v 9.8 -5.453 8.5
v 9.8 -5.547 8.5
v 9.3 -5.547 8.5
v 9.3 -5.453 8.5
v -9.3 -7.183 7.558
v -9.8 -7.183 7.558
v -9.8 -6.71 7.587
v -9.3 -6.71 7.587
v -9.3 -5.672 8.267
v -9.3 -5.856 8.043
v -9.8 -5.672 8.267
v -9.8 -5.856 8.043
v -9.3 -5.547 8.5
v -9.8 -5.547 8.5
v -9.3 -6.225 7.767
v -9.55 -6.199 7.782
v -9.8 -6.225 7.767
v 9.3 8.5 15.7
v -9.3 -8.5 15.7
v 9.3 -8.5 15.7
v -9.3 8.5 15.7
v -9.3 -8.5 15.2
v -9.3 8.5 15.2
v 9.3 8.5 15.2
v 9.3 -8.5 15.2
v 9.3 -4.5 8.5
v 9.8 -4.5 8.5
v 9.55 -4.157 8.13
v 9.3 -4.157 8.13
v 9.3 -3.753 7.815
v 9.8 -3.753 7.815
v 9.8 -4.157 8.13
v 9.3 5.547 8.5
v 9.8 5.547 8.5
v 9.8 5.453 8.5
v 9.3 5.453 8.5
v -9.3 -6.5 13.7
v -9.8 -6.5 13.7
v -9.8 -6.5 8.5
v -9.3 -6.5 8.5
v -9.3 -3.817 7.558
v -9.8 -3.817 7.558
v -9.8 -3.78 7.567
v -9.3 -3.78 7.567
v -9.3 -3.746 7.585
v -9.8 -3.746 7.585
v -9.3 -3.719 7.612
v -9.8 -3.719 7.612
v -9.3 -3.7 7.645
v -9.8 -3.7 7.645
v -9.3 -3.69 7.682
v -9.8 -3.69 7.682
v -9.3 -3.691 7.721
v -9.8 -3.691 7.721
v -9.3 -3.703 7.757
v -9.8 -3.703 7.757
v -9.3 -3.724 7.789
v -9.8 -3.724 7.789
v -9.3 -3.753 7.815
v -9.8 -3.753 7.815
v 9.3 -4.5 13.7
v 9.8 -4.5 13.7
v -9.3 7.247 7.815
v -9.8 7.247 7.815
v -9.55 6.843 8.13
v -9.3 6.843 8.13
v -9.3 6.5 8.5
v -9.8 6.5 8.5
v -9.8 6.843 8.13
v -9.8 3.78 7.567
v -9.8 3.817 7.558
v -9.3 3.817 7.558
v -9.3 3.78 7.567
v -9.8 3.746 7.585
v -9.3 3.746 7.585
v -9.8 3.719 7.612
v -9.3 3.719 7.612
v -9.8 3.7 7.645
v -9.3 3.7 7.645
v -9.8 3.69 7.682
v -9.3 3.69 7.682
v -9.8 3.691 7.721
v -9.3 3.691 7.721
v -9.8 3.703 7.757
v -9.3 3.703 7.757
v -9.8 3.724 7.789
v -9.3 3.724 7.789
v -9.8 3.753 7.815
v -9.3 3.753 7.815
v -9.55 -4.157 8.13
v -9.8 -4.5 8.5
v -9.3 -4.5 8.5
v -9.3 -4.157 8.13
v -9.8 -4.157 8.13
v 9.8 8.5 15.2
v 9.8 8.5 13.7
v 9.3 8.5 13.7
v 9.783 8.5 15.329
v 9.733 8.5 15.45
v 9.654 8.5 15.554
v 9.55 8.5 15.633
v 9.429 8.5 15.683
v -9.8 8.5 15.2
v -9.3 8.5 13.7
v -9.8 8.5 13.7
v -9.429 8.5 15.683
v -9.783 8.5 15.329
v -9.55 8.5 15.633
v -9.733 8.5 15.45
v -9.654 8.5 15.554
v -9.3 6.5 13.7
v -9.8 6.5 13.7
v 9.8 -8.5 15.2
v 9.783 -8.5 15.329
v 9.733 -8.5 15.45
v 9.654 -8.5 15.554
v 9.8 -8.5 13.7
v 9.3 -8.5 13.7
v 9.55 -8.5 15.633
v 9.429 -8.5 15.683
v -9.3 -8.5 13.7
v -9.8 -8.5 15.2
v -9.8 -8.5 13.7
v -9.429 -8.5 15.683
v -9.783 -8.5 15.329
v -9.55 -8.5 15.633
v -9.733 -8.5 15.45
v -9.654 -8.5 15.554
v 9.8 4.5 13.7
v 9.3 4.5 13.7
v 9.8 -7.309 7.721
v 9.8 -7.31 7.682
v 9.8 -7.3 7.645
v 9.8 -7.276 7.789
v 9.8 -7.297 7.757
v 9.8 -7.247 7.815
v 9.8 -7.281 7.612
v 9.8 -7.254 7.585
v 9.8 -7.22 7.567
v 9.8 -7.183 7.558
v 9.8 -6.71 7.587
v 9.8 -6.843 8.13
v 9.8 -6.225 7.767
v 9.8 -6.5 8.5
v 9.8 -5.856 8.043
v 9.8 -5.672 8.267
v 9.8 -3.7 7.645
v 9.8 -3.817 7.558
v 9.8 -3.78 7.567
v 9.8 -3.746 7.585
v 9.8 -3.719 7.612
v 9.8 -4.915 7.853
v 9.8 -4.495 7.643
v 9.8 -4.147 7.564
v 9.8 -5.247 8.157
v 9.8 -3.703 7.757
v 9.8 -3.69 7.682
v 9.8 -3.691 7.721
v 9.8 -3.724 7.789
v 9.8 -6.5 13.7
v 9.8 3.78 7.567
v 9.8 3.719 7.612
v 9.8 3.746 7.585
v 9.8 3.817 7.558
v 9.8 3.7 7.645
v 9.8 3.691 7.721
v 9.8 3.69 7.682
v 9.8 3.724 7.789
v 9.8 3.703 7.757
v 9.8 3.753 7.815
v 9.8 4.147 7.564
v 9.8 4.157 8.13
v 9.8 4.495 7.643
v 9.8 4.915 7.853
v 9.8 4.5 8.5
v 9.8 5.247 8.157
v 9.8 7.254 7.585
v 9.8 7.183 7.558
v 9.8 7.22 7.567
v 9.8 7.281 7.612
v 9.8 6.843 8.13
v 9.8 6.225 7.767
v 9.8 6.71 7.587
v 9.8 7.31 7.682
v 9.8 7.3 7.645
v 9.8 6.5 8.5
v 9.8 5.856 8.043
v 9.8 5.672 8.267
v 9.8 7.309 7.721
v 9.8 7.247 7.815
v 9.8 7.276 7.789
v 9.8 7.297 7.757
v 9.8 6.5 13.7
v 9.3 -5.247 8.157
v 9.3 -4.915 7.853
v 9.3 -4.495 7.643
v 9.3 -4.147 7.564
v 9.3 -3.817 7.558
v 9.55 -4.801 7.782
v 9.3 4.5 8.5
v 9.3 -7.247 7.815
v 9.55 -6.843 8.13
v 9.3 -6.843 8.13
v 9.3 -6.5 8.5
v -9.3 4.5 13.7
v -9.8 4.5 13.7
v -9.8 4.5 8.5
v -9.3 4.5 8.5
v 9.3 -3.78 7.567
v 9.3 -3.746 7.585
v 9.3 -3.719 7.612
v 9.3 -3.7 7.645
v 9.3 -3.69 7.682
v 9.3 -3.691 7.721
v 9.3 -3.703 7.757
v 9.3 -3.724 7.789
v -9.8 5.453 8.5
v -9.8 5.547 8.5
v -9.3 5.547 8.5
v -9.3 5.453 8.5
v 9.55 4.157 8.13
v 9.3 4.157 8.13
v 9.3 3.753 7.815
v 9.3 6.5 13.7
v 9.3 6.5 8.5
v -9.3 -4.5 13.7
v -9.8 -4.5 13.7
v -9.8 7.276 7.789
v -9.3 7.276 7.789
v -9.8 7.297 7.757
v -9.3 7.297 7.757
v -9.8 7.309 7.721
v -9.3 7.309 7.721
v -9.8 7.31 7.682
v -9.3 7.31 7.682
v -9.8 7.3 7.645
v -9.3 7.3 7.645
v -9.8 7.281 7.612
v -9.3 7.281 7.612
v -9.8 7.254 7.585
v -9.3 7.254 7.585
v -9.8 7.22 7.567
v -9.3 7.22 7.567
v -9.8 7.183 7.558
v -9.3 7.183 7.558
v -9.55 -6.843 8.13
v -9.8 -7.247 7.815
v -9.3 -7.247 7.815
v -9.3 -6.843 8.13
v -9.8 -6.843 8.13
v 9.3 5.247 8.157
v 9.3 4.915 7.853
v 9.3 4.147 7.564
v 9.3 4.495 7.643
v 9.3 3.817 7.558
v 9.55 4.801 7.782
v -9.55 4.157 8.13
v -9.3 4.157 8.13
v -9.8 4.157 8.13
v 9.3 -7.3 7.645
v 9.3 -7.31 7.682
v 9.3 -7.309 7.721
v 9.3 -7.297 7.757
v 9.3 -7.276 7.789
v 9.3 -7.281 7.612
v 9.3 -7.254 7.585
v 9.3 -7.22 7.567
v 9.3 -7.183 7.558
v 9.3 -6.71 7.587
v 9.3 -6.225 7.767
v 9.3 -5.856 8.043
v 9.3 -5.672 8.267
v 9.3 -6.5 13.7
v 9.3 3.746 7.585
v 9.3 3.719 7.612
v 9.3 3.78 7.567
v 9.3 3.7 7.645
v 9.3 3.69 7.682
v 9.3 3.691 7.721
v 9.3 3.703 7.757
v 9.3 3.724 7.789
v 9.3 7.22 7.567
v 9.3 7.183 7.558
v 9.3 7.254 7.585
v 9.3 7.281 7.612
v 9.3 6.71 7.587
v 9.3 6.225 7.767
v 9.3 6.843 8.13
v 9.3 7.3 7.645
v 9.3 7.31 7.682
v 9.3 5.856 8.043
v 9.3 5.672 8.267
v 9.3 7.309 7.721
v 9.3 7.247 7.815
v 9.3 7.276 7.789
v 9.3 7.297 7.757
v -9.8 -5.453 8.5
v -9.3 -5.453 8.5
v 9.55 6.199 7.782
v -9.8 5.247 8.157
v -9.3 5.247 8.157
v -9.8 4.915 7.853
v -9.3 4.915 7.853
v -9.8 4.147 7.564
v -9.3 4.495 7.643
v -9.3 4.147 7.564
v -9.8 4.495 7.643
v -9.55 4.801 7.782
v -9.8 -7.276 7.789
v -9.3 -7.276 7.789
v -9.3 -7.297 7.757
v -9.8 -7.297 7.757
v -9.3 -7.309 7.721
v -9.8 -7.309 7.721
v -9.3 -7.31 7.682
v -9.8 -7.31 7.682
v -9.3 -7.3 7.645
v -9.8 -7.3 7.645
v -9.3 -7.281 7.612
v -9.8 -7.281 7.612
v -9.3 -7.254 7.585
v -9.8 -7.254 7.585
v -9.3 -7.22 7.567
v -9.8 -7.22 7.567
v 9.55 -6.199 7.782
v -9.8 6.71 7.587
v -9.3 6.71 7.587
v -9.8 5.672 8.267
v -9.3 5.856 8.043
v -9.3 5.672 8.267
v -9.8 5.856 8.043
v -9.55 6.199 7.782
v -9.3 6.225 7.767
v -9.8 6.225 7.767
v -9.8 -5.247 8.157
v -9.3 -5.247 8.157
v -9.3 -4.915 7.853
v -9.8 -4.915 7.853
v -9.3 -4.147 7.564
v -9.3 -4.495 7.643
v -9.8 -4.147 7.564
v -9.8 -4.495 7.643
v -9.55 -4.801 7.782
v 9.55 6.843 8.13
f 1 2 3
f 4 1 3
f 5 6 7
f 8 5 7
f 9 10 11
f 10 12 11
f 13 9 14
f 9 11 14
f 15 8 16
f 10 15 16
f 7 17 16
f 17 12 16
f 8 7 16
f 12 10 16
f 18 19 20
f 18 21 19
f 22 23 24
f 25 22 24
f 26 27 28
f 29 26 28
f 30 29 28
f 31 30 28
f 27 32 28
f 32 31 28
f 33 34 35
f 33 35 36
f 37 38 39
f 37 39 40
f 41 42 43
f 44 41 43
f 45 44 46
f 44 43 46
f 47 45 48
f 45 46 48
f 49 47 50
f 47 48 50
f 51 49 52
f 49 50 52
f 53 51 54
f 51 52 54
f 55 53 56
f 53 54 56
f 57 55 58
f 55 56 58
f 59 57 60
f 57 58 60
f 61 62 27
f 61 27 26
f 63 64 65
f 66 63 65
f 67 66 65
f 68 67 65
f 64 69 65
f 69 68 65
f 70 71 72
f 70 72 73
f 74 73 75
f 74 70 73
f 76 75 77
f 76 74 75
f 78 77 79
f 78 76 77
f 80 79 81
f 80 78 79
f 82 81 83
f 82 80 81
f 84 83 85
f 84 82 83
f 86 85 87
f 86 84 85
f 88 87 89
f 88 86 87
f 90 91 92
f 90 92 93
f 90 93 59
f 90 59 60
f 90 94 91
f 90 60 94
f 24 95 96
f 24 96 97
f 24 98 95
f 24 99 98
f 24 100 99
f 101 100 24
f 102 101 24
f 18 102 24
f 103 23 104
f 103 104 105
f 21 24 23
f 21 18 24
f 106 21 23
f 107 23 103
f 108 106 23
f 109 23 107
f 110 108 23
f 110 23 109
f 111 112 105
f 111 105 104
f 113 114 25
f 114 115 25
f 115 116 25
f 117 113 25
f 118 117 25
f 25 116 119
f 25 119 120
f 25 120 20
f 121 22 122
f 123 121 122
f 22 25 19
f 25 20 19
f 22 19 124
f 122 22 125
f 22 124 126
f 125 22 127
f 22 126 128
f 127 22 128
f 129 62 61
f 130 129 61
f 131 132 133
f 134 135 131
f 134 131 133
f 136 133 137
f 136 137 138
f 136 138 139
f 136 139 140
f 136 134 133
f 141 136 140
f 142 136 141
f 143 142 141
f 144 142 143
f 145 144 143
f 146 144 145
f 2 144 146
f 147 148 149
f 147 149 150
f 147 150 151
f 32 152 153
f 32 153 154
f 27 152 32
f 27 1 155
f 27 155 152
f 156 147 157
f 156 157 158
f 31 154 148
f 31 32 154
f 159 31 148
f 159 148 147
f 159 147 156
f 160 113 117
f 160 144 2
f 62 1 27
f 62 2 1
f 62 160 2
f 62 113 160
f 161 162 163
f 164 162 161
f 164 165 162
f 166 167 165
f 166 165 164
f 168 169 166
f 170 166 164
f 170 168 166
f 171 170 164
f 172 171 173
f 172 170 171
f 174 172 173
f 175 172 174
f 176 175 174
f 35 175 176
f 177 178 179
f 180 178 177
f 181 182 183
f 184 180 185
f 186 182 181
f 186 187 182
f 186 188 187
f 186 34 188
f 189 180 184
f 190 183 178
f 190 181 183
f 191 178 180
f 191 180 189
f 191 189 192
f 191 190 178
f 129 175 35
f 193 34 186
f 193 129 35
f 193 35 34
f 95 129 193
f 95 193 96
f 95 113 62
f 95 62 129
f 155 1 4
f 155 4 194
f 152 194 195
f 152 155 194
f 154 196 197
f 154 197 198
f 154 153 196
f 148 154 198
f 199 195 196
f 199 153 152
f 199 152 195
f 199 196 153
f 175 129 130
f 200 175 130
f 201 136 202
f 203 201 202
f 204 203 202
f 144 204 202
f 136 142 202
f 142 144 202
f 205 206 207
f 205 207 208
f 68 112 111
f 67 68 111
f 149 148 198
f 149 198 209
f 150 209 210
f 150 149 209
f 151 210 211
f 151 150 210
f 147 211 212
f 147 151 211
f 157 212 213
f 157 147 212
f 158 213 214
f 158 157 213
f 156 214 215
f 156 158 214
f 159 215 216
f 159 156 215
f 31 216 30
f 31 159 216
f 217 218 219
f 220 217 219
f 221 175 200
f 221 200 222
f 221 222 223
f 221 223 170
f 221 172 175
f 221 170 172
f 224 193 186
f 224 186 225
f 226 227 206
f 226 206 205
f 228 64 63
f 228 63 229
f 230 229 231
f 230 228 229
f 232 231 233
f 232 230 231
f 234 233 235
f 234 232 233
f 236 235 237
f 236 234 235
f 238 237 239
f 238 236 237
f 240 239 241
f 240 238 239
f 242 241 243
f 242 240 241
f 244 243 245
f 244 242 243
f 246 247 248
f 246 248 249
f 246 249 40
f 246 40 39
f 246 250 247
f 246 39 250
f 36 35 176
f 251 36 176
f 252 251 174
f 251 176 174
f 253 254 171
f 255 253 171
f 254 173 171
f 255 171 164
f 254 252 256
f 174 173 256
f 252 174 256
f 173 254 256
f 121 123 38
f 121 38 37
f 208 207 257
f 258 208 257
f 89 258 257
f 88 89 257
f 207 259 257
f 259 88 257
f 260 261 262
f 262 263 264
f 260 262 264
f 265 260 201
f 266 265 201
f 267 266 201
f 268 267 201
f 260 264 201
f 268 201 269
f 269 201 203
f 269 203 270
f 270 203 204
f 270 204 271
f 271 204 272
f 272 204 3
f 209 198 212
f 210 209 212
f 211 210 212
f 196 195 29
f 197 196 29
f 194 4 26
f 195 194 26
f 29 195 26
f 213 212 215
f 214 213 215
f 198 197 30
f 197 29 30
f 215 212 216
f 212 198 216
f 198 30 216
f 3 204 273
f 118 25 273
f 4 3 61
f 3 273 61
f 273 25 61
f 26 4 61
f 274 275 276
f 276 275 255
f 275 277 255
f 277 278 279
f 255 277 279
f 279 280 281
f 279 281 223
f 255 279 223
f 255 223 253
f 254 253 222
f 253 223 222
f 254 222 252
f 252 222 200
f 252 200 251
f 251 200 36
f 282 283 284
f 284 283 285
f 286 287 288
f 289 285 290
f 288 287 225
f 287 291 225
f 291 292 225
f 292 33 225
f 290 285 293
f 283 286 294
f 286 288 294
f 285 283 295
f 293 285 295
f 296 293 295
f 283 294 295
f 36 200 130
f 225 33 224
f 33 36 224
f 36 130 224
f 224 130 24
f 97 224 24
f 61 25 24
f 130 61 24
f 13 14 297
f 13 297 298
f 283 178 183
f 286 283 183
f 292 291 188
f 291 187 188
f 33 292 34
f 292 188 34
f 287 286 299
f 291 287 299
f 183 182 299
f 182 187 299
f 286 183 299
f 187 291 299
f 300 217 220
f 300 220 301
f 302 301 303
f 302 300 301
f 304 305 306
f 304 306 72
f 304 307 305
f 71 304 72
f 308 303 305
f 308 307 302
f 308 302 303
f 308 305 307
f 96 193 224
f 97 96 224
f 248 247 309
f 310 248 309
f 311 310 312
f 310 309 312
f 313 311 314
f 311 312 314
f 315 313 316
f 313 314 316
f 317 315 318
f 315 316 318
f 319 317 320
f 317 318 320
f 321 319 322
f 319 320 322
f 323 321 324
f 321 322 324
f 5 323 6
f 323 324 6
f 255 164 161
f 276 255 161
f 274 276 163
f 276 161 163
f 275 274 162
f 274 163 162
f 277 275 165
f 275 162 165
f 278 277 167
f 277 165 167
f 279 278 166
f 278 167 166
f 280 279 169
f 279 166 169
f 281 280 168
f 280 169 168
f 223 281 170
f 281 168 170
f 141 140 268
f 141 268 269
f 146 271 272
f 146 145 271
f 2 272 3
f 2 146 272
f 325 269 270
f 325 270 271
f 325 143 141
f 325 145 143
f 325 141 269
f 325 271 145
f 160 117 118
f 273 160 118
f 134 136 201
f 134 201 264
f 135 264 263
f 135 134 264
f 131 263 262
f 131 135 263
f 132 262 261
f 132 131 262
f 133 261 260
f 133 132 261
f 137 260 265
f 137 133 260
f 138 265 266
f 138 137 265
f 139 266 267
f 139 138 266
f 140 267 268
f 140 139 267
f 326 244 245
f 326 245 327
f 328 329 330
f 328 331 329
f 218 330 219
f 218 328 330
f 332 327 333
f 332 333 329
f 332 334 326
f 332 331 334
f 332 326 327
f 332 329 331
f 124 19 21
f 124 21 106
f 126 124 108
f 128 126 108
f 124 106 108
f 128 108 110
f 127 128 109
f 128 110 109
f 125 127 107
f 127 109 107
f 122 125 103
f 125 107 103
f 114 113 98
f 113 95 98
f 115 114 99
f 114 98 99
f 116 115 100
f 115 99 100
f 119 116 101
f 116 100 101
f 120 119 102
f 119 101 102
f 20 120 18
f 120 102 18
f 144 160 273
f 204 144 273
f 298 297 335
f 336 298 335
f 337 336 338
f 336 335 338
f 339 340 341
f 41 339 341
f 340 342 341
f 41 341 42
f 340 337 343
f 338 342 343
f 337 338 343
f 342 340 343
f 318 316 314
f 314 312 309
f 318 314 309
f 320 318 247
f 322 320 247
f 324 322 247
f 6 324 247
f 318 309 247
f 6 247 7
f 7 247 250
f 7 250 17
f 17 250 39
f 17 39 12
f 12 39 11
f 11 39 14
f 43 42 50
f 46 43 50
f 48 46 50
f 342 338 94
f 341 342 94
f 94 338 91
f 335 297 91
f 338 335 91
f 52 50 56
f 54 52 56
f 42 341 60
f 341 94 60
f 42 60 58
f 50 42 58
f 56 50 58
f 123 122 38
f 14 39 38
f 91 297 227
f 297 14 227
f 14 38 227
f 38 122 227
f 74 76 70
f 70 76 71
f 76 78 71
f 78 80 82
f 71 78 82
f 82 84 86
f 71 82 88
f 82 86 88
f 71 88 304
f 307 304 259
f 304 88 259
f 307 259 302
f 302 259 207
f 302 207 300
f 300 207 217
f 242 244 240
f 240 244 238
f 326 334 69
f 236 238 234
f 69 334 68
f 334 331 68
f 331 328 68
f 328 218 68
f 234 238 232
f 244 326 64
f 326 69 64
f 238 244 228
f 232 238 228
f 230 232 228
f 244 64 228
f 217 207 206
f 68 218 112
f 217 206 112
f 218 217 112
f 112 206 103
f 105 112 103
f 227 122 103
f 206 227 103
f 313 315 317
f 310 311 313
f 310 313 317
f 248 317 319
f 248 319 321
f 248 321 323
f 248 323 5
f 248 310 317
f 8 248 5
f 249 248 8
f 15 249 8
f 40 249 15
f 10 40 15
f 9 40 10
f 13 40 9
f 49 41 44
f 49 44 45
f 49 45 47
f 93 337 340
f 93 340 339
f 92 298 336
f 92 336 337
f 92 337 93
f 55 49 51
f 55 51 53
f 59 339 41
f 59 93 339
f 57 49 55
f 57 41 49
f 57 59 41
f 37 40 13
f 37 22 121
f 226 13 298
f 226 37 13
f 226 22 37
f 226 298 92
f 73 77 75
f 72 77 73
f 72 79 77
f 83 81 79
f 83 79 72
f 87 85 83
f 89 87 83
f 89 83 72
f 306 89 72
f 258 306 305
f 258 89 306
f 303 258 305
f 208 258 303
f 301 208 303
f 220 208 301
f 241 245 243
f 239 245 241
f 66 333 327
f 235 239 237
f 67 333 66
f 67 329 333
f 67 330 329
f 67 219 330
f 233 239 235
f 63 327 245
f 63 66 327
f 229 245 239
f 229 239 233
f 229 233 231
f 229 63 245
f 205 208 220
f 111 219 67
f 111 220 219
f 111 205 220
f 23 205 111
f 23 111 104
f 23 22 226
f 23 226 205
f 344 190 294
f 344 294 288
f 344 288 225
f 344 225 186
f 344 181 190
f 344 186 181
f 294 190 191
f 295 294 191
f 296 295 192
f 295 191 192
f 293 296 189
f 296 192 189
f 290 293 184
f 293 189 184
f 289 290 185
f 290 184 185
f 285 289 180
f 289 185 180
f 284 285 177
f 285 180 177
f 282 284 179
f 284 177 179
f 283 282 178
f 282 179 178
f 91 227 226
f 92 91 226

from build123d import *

# Parameters (mm, degrees)
SKETCH006_W                = 19.6
SKETCH006_H                = 17
PAD001_DEPTH               = 0.5
SKETCH011_W                = 0.5
SKETCH011_H                = 17
PAD002_DEPTH               = 1.5
SKETCH012_W                = 0.5
SKETCH012_H                = 2
PAD003_DEPTH               = 5.2
SKETCH012_MIRRORED008_2_W  = 0.5
SKETCH012_MIRRORED008_2_H  = 2
PAD003_MIRRORED008_2_DEPTH = 5.2
PAD004_DEPTH               = 0.5
PAD004_MIRRORED010_2_DEPTH = 0.5
FILLET_R                   = 0.5


with BuildPart() as part:
    # Sketch006 → Pad001 (new body)
    with BuildSketch(Plane.XY.offset(15.2)):
        Rectangle(SKETCH006_W, SKETCH006_H)
    extrude(amount=PAD001_DEPTH)

    # Sketch011 (on Face5 of Pad001) → Pad002 (join)
    with BuildSketch(Plane(origin=(0, 0, 15.2), x_dir=(1, 0, 0), z_dir=(0, 0, -1))):
        with Locations((-9.55, 0)):
            Rectangle(SKETCH011_W, SKETCH011_H)
    pad002 = extrude(amount=PAD002_DEPTH)

    # Mirrored007: Pad002 across YZ
    add(pad002.mirror(Plane.YZ))

    # Sketch012 (on Face5 of Mirrored007) → Pad003 (join)
    with BuildSketch(Plane(origin=(0, 0, 13.7), x_dir=(1, 0, 0), z_dir=(0, 0, -1))):
        with Locations((-9.55, 5.5)):
            Rectangle(SKETCH012_W, SKETCH012_H)
    pad003 = extrude(amount=PAD003_DEPTH)

    # Sketch012 Mirrored008 2 → Pad003 Mirrored008 2 (add)
    with BuildSketch(Plane(origin=(0, 0, 13.7), x_dir=(-1, 0, 0), z_dir=(0, 0, 1))):
        with Locations((-9.55, 5.5)):
            Rectangle(SKETCH012_MIRRORED008_2_W, SKETCH012_MIRRORED008_2_H)
    pad003_mirrored008_2 = extrude(amount=-PAD003_MIRRORED008_2_DEPTH)

    # Mirrored009: Pad003, Pad003 Mirrored008 2 across XZ
    add(pad003.mirror(Plane.XZ))
    add(pad003_mirrored008_2.mirror(Plane.XZ))

    # Sketch013 (on Face24 of MultiTransform001) → Pad004 (join)
    with BuildSketch(Plane(origin=(-9.8, 0, 0), x_dir=(0, -1, 0), z_dir=(-1, 0, 0))):
        with BuildLine():
            ThreePointArc((-7.247226, 7.814702), (-7.306335, 7.663488), (-7.182824, 7.558111))
            add(Edge.make_bspline(
                [(-7.182824, 7.558111), (-5.976509, 7.451929), (-5.547279, 8.5)],
                knots=[1.033239, 1.033239, 1.033239, 2.478771, 2.478771, 2.478771], degree=2, weights=[1, 0.749979, 1]))
            Line((-5.547279, 8.5), (-6.5, 8.5))
            add(Edge.make_bspline(
                [(-7.247226, 7.814702), (-6.810749, 8.100432), (-6.5, 8.5)],
                knots=[1.339981, 1.339981, 1.339981, 1.941601, 1.941601, 1.941601], degree=2, weights=[1, 0.955097, 1]))
        make_face()
        with BuildLine():
            add(Edge.make_bspline(
                [(-5.452721, 8.5), (-5.023491, 7.451929), (-3.817176, 7.558111)],
                knots=[3.804414, 3.804414, 3.804414, 5.249946, 5.249946, 5.249946], degree=2, weights=[1, 0.749979, 1]))
            ThreePointArc((-3.817176, 7.558111), (-3.693665, 7.663488), (-3.752774, 7.814702))
            add(Edge.make_bspline(
                [(-4.5, 8.5), (-4.189251, 8.100432), (-3.752774, 7.814702)],
                knots=[4.341585, 4.341585, 4.341585, 4.943204, 4.943204, 4.943204], degree=2, weights=[1, 0.955097, 1]))
            Line((-4.5, 8.5), (-5.452721, 8.5))
        make_face()
    pad004 = extrude(amount=-PAD004_DEPTH)

    # Sketch013 Mirrored010 2 → Pad004 Mirrored010 2 (add)
    with BuildSketch(Plane(origin=(9.8, 0, 0), x_dir=(0, -1, 0), z_dir=(-1, 0, 0))):
        with BuildLine():
            ThreePointArc((-7.247226, 7.814702), (-7.306335, 7.663488), (-7.182824, 7.558111))
            add(Edge.make_bspline(
                [(-7.182824, 7.558111), (-5.976509, 7.451929), (-5.547279, 8.5)],
                knots=[1.033239, 1.033239, 1.033239, 2.478771, 2.478771, 2.478771], degree=2, weights=[1, 0.749979, 1]))
            Line((-5.547279, 8.5), (-6.5, 8.5))
            add(Edge.make_bspline(
                [(-7.247226, 7.814702), (-6.810749, 8.100432), (-6.5, 8.5)],
                knots=[1.339981, 1.339981, 1.339981, 1.941601, 1.941601, 1.941601], degree=2, weights=[1, 0.955097, 1]))
        make_face()
        with BuildLine():
            add(Edge.make_bspline(
                [(-5.452721, 8.5), (-5.023491, 7.451929), (-3.817176, 7.558111)],
                knots=[3.804414, 3.804414, 3.804414, 5.249946, 5.249946, 5.249946], degree=2, weights=[1, 0.749979, 1]))
            ThreePointArc((-3.817176, 7.558111), (-3.693665, 7.663488), (-3.752774, 7.814702))
            add(Edge.make_bspline(
                [(-4.5, 8.5), (-4.189251, 8.100432), (-3.752774, 7.814702)],
                knots=[4.341585, 4.341585, 4.341585, 4.943204, 4.943204, 4.943204], degree=2, weights=[1, 0.955097, 1]))
            Line((-4.5, 8.5), (-5.452721, 8.5))
        make_face()
    pad004_mirrored010_2 = extrude(amount=PAD004_MIRRORED010_2_DEPTH)

    # Mirrored011: Pad004, Pad004 Mirrored010 2 across XZ
    add(pad004.mirror(Plane.XZ))
    add(pad004_mirrored010_2.mirror(Plane.XZ))

    # Fillet
    fillet_edges = [part.edges().sort_by_distance(p)[0] for p in [
        (-9.8, 0, 15.7),
        (9.8, 0, 15.7),
    ]]
    fillet(fillet_edges, radius=FILLET_R)


solid = part.part
